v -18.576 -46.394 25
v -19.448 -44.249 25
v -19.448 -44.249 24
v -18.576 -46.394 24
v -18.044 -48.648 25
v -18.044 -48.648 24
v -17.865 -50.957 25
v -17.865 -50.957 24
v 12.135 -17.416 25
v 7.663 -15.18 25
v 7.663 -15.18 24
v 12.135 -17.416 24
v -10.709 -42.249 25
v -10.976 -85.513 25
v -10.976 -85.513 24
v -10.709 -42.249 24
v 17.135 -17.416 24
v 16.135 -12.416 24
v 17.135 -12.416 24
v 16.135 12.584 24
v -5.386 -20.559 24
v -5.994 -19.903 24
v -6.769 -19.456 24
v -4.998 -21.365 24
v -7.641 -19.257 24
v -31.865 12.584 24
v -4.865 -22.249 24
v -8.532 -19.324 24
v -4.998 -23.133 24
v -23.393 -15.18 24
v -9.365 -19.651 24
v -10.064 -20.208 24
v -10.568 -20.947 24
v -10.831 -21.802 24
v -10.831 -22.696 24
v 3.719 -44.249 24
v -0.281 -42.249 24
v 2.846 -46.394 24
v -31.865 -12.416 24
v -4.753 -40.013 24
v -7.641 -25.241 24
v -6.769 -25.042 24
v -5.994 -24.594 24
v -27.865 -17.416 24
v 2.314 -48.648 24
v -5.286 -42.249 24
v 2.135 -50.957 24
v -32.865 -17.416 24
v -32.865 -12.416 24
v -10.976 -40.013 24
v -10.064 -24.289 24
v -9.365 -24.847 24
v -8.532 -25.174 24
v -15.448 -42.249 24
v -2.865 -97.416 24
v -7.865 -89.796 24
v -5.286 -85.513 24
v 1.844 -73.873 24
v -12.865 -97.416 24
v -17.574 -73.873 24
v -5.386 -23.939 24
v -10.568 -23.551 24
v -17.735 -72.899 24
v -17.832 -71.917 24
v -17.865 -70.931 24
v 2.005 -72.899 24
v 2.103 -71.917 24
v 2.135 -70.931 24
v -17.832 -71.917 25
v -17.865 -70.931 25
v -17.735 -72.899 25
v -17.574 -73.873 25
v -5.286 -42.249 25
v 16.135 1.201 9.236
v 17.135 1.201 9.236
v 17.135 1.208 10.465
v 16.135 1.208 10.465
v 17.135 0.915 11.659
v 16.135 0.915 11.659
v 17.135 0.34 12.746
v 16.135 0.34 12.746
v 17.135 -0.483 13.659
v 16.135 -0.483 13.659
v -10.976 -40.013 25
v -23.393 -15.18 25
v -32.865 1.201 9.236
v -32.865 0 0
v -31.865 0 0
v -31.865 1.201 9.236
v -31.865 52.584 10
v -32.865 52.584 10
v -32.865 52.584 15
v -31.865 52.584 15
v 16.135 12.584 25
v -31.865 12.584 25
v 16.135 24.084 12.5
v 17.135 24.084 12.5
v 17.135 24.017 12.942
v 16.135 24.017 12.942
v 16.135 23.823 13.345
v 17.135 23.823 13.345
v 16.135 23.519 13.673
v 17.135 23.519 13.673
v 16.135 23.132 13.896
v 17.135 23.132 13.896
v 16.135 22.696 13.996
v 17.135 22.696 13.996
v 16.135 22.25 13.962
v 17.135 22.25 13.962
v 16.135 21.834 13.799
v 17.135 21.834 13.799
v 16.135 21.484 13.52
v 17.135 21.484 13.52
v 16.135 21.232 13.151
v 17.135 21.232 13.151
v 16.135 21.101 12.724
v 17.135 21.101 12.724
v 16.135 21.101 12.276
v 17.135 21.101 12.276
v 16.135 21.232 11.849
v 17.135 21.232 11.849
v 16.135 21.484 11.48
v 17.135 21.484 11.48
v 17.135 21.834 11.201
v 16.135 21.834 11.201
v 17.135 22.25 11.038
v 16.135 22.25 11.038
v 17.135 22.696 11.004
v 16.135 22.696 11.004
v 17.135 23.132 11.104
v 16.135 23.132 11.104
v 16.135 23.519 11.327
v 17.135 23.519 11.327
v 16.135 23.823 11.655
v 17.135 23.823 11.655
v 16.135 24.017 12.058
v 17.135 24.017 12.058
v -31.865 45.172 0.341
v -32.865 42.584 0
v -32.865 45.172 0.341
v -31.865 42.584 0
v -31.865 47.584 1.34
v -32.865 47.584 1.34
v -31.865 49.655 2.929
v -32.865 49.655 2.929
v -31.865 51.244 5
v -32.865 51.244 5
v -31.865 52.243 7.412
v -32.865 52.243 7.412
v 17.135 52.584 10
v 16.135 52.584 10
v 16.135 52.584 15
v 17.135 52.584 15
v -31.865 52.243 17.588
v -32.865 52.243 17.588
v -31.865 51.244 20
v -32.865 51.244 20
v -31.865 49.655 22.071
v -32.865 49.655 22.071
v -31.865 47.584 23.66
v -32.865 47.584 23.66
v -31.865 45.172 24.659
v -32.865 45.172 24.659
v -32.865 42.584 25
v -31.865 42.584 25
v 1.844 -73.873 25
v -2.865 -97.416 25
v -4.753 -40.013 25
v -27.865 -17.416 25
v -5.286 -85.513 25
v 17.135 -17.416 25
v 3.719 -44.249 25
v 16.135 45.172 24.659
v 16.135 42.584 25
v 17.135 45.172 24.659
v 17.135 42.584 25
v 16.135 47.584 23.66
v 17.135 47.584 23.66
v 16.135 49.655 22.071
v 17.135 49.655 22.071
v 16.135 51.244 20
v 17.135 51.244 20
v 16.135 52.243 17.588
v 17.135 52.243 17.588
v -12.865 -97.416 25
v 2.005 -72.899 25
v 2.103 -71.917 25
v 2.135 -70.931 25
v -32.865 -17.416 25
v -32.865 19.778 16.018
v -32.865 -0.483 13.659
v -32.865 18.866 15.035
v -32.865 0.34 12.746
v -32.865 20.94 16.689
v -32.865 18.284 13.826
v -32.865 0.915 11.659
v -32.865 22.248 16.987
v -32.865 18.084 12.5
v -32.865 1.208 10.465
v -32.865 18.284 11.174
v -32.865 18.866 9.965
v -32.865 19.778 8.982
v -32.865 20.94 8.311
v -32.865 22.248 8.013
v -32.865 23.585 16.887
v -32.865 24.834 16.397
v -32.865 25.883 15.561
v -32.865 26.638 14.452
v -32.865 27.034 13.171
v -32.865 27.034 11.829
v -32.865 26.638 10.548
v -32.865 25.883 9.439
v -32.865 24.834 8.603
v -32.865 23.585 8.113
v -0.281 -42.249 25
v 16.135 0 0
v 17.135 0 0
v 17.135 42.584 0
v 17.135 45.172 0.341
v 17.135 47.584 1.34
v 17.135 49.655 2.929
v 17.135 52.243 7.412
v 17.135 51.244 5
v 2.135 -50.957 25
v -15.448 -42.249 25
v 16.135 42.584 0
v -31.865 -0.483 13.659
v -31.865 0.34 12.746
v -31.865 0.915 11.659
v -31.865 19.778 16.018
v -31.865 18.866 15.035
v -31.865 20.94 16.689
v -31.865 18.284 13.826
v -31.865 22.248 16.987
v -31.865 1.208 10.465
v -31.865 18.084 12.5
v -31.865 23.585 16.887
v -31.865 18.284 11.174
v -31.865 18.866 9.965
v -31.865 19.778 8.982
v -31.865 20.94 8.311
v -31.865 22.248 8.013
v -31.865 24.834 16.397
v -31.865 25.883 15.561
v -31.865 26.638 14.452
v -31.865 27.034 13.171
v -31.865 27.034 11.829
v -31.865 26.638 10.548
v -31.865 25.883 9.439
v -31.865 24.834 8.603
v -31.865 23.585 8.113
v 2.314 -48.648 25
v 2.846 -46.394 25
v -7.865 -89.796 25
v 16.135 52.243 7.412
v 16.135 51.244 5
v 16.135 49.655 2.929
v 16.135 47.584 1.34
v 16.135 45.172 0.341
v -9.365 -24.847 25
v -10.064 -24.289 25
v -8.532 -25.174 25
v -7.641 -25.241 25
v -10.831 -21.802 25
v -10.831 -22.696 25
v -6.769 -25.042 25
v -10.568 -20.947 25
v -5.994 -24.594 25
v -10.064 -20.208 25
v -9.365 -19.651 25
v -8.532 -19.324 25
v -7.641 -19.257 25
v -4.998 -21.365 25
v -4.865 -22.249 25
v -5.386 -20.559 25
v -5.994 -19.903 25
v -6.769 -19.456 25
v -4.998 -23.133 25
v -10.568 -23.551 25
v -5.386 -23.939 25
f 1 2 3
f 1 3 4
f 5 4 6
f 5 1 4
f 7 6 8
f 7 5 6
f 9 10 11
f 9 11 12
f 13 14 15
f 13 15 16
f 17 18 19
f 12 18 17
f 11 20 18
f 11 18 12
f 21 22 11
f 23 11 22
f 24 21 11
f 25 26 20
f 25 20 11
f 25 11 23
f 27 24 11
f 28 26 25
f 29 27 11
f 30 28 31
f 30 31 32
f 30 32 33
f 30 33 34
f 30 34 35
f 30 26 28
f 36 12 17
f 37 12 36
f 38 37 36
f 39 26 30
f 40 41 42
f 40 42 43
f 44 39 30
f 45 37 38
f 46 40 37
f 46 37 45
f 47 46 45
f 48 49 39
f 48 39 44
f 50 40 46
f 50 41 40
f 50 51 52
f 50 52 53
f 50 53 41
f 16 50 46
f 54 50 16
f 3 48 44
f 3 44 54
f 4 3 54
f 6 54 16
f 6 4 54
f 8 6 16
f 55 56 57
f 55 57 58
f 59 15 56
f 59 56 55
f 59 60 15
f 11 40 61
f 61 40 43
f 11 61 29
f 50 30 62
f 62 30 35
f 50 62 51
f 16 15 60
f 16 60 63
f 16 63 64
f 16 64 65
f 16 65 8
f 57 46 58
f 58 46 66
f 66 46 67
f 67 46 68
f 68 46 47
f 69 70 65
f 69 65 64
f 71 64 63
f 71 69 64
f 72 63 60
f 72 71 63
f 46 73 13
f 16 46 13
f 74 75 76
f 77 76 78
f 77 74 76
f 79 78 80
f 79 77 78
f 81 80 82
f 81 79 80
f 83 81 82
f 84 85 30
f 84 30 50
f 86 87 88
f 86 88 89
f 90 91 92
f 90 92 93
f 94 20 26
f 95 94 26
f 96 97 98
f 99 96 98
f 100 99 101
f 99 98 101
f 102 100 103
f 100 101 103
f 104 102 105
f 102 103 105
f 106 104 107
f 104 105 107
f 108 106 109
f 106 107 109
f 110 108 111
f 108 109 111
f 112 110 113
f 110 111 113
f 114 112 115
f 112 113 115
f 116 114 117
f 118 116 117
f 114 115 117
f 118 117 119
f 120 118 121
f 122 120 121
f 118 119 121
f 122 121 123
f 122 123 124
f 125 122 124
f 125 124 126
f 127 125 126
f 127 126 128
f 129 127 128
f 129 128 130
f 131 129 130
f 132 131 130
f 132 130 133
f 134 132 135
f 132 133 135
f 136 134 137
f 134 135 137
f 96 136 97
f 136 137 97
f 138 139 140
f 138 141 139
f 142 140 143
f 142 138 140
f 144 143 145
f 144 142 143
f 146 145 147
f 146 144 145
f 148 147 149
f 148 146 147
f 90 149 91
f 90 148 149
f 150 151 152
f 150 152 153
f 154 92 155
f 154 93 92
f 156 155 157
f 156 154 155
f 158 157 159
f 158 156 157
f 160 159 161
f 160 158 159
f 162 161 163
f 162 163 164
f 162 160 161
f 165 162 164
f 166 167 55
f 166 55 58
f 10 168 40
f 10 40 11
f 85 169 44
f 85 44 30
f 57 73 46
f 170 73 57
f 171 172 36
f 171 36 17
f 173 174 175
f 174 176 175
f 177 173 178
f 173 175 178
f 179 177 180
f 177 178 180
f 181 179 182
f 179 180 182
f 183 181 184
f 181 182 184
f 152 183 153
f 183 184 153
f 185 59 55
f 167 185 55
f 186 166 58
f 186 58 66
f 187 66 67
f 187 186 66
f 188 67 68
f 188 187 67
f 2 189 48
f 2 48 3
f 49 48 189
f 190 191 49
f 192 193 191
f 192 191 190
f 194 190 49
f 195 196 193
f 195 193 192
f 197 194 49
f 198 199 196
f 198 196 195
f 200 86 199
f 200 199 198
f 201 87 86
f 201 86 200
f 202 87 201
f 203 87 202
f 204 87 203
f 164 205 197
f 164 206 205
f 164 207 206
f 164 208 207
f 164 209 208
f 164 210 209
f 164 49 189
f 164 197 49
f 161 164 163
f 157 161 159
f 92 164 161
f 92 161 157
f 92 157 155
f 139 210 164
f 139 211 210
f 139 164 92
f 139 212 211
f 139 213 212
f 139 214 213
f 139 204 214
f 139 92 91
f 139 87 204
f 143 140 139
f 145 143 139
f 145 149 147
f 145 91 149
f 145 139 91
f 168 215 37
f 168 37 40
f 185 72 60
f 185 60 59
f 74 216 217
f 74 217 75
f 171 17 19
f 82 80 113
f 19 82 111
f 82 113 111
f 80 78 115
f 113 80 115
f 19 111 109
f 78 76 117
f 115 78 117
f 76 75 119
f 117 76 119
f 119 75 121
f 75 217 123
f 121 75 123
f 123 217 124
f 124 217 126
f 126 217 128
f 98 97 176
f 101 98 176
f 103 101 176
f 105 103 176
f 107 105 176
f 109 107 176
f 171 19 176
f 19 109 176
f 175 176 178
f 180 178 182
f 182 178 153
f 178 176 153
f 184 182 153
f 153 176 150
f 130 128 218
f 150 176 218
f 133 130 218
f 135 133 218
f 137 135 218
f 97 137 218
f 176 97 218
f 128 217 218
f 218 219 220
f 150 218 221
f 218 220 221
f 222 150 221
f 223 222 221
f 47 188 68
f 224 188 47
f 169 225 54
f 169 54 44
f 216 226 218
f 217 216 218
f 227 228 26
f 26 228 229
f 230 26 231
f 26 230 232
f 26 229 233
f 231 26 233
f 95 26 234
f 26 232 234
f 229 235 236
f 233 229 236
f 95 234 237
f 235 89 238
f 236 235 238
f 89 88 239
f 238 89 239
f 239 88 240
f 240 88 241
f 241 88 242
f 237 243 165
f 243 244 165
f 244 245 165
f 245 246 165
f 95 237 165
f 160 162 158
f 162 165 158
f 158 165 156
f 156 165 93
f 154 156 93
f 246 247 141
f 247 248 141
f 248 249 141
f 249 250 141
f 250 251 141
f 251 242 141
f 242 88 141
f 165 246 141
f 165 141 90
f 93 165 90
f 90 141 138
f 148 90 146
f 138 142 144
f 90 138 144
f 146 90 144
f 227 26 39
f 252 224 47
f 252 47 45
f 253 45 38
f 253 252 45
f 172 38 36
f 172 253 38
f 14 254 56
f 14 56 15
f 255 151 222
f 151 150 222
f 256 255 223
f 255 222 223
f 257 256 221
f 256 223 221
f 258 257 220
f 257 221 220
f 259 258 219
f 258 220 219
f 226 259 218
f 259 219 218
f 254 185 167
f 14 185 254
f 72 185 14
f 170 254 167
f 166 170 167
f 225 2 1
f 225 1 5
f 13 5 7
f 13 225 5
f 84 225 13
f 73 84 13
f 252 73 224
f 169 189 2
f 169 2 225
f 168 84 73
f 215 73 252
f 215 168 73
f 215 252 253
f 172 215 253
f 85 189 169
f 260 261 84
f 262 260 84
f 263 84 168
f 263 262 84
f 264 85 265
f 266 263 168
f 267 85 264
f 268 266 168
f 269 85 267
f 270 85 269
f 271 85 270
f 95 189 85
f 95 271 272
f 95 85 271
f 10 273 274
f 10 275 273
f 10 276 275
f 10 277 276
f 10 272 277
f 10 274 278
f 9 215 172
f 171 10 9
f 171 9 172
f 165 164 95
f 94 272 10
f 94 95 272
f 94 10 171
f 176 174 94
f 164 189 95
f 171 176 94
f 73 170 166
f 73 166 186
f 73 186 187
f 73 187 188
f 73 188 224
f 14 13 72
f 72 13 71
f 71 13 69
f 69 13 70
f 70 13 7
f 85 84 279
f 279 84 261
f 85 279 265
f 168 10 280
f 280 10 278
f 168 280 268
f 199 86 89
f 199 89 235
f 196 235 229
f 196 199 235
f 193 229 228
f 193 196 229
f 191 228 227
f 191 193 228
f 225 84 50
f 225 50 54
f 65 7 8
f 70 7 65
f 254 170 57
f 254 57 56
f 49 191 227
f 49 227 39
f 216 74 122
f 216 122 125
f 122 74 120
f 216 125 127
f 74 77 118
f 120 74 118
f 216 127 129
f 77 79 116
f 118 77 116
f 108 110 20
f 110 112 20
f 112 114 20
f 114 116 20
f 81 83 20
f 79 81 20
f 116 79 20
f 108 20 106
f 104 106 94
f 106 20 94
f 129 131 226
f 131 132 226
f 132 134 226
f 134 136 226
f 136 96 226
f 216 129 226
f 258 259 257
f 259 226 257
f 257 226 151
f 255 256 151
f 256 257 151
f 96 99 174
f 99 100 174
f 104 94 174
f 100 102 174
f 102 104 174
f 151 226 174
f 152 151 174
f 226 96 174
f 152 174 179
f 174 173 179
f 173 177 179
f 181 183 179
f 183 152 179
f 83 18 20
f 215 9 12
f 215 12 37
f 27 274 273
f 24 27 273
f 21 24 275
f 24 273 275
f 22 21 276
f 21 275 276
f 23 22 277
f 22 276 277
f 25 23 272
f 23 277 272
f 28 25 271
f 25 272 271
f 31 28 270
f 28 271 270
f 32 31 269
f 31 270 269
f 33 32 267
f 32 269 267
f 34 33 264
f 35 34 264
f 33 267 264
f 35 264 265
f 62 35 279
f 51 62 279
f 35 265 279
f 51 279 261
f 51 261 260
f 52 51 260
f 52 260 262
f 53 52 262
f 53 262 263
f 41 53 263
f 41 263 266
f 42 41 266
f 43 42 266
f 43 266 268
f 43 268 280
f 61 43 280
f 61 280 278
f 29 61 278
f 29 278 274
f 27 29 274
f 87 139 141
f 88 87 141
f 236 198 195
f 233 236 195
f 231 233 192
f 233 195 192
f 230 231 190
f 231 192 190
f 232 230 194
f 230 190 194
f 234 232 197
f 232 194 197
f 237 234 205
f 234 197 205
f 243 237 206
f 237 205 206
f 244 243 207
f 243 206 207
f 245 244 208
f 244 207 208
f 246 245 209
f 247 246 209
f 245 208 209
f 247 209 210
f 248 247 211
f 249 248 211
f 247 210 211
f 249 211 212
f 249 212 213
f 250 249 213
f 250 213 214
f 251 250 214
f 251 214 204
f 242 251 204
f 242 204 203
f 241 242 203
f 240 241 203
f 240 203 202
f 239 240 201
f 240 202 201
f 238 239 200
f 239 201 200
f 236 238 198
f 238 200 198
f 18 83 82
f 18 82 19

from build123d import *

# Parameters (mm, degrees)
CROQUIS2_W              = 50
CROQUIS2_H              = 150
SALIENTE_EXTRUIR1_DEPTH = 25
CROQUIS6_W              = 48
CROQUIS6_H              = 40
CORTAR_EXTRUIR1_DEPTH   = 25
VACIADO2_START          = -31.864905155
VACIADO2_OUTLINE_W      = 110
VACIADO2_OUTLINE_H      = 23
VACIADO2_DEPTH          = 48
CROQUIS8_R              = 4.5
CORTAR_EXTRUIR3_DEPTH   = 1
CROQUIS9_W              = 48
CROQUIS9_H              = 110
CORTAR_EXTRUIR4_DEPTH   = 10
CORTAR_EXTRUIR5_DEPTH   = 1
CORTAR_EXTRUIR6_DEPTH   = 1
CROQUIS12_R             = 1.5
CORTAR_EXTRUIR7_DEPTH   = 1
CROQUIS13_R             = 3
CORTAR_EXTRUIR8_DEPTH   = 10
REDONDEO1_R             = 10
CORTAR_EXTRUIR9_DEPTH   = 50


# Read off the part's stored shape, not the designer's step: Vaciado2
with BuildPart() as part:
    # Croquis2 → Saliente-Extruir1 (new body)
    with BuildSketch(Plane.XY):
        with Locations((-7.864905155, -22.416151752)):
            Rectangle(CROQUIS2_W, CROQUIS2_H)
    extrude(amount=SALIENTE_EXTRUIR1_DEPTH)

    # Croquis6 → Cortar-Extruir1 (cut)
    with BuildSketch(Plane(origin=(0, 0, 0), x_dir=(-1, 0, 0), z_dir=(0, 0, -1))):
        with Locations((7.864905155, 32.583848248)):
            Rectangle(CROQUIS6_W, CROQUIS6_H)
    extrude(amount=-CORTAR_EXTRUIR1_DEPTH, mode=Mode.SUBTRACT)

    # Vaciado2 outline → Vaciado2 (cut)
    with BuildSketch(Plane.YZ.offset(VACIADO2_START)):
        with Locations((-42.416151752, 12.5)):
            Rectangle(VACIADO2_OUTLINE_W, VACIADO2_OUTLINE_H)
    extrude(amount=VACIADO2_DEPTH, mode=Mode.SUBTRACT)

    # Croquis8 → Cortar-Extruir3 (cut)
    with BuildSketch(Plane.ZY.offset(32.864905155)):
        with Locations(Location((12.5, 22.583848248, 0), (0, 0, 270))):
            Circle(CROQUIS8_R)
    extrude(amount=-CORTAR_EXTRUIR3_DEPTH, mode=Mode.SUBTRACT)

    # Croquis9 → Cortar-Extruir4 (cut)
    with BuildSketch(Plane(origin=(0, 0, 0), x_dir=(-1, 0, 0), z_dir=(0, 0, -1))):
        with Locations((7.864905155, -42.416151752)):
            Rectangle(CROQUIS9_W, CROQUIS9_H)
    extrude(amount=-CORTAR_EXTRUIR4_DEPTH, mode=Mode.SUBTRACT)

    # Croquis10 → Cortar-Extruir5 (cut)
    with BuildSketch(Plane.ZY.offset(32.864905155)):
        Polygon((0, 0), (24, -12.416151752), (24, -97.416151752), (0, -97.416151752), align=None)
    extrude(amount=-CORTAR_EXTRUIR5_DEPTH, mode=Mode.SUBTRACT)

    # Croquis11 → Cortar-Extruir6 (cut)
    with BuildSketch(Plane(origin=(17.135094845, 0, 0), x_dir=(0, 0, -1), z_dir=(1, 0, 0))):
        Polygon((0, 0), (-24, -12.416151752), (-24, -97.416151752), (0, -97.416151752), align=None)
    extrude(amount=-CORTAR_EXTRUIR6_DEPTH, mode=Mode.SUBTRACT)

    # Croquis12 → Cortar-Extruir7 (cut)
    with BuildSketch(Plane(origin=(17.135094845, 0, 0), x_dir=(0, 0, -1), z_dir=(1, 0, 0))):
        with Locations(Location((-12.5, 22.583848248, 0), (0, 0, 90))):
            Circle(CROQUIS12_R)
    extrude(amount=-CORTAR_EXTRUIR7_DEPTH, mode=Mode.SUBTRACT)

    # Croquis13 → Cortar-Extruir8 (cut)
    with BuildSketch(Plane.XY.offset(25)):
        with Locations((-7.864905155, -22.248967482)):
            Circle(CROQUIS13_R)
        with BuildLine():
            Line((-17.864905155, -50.957171414), (-17.864905155, -70.930859048))
            ThreePointArc((-17.864905155, -70.930859048), (-17.791905055, -72.408923317), (-17.57361529, -73.872601075))
            Line((-17.57361529, -73.872601075), (-12.864905155, -97.416151752))
            Line((-12.864905155, -97.416151752), (-32.864905155, -97.416151752))
            Line((-32.864905155, -97.416151752), (-32.864905155, -17.416151752))
            Line((-32.864905155, -17.416151752), (-19.44849729, -44.248967482))
            ThreePointArc((-19.44849729, -44.248967482), (-18.266170313, -47.510877606), (-17.864905155, -50.957171414))
        make_face()
        Polygon((-27.864905155, -17.416151752), (-23.3927692, -15.180083774), (-10.976361335, -40.012899504), (-15.44849729, -42.248967482), align=None)
        with BuildLine():
            Line((-2.864905155, -97.416151752), (1.84380498, -73.872601075))
            ThreePointArc((1.84380498, -73.872601075), (2.062094745, -72.408923317), (2.135094845, -70.930859048))
            Line((2.135094845, -70.930859048), (2.135094845, -50.957171414))
            ThreePointArc((2.135094845, -50.957171414), (2.536360003, -47.510877606), (3.71868698, -44.248967482))
            Line((3.71868698, -44.248967482), (17.135094845, -17.416151752))
            Line((17.135094845, -17.416151752), (17.135094845, -97.416151752))
            Line((17.135094845, -97.416151752), (-2.864905155, -97.416151752))
        make_face()
        Polygon((12.135094845, -17.416151752), (-0.28131302, -42.248967482), (-4.753448975, -40.012899504), (7.66295889, -15.180083774), align=None)
        Polygon((-7.864905155, -42.248967482), (-5.285539059, -42.248967482), (-5.285539059, -85.512580171), (-7.864905155, -89.795904878), (-10.976361335, -85.512580171), (-10.709188819, -42.248967482), align=None)
    extrude(amount=-CORTAR_EXTRUIR8_DEPTH, mode=Mode.SUBTRACT)

    # Redondeo1
    redondeo1_edges = [part.edges().sort_by_distance(p)[0] for p in [
        (16.635094845, 52.583848248, 25),
        (-32.364905155, 52.583848248, 0),
        (-32.364905155, 52.583848248, 25),
        (16.635094845, 52.583848248, 0),
    ]]
    fillet(redondeo1_edges, radius=REDONDEO1_R)

    # Croquis14 → Cortar-Extruir9 (cut)
    with BuildSketch(Plane.ZY.offset(32.864905155)):
        with BuildLine():
            Line((0, 0), (9.235899895, 1.20073778))
            ThreePointArc((9.235899895, 1.20073778), (11.659366349, 0.915331151), (13.659135181, -0.483086245))
            Line((13.659135181, -0.483086245), (24, -12.416151752))
            Line((24, -12.416151752), (0, 0))
        make_face()
    extrude(amount=-CORTAR_EXTRUIR9_DEPTH, mode=Mode.SUBTRACT)


solid = part.part
